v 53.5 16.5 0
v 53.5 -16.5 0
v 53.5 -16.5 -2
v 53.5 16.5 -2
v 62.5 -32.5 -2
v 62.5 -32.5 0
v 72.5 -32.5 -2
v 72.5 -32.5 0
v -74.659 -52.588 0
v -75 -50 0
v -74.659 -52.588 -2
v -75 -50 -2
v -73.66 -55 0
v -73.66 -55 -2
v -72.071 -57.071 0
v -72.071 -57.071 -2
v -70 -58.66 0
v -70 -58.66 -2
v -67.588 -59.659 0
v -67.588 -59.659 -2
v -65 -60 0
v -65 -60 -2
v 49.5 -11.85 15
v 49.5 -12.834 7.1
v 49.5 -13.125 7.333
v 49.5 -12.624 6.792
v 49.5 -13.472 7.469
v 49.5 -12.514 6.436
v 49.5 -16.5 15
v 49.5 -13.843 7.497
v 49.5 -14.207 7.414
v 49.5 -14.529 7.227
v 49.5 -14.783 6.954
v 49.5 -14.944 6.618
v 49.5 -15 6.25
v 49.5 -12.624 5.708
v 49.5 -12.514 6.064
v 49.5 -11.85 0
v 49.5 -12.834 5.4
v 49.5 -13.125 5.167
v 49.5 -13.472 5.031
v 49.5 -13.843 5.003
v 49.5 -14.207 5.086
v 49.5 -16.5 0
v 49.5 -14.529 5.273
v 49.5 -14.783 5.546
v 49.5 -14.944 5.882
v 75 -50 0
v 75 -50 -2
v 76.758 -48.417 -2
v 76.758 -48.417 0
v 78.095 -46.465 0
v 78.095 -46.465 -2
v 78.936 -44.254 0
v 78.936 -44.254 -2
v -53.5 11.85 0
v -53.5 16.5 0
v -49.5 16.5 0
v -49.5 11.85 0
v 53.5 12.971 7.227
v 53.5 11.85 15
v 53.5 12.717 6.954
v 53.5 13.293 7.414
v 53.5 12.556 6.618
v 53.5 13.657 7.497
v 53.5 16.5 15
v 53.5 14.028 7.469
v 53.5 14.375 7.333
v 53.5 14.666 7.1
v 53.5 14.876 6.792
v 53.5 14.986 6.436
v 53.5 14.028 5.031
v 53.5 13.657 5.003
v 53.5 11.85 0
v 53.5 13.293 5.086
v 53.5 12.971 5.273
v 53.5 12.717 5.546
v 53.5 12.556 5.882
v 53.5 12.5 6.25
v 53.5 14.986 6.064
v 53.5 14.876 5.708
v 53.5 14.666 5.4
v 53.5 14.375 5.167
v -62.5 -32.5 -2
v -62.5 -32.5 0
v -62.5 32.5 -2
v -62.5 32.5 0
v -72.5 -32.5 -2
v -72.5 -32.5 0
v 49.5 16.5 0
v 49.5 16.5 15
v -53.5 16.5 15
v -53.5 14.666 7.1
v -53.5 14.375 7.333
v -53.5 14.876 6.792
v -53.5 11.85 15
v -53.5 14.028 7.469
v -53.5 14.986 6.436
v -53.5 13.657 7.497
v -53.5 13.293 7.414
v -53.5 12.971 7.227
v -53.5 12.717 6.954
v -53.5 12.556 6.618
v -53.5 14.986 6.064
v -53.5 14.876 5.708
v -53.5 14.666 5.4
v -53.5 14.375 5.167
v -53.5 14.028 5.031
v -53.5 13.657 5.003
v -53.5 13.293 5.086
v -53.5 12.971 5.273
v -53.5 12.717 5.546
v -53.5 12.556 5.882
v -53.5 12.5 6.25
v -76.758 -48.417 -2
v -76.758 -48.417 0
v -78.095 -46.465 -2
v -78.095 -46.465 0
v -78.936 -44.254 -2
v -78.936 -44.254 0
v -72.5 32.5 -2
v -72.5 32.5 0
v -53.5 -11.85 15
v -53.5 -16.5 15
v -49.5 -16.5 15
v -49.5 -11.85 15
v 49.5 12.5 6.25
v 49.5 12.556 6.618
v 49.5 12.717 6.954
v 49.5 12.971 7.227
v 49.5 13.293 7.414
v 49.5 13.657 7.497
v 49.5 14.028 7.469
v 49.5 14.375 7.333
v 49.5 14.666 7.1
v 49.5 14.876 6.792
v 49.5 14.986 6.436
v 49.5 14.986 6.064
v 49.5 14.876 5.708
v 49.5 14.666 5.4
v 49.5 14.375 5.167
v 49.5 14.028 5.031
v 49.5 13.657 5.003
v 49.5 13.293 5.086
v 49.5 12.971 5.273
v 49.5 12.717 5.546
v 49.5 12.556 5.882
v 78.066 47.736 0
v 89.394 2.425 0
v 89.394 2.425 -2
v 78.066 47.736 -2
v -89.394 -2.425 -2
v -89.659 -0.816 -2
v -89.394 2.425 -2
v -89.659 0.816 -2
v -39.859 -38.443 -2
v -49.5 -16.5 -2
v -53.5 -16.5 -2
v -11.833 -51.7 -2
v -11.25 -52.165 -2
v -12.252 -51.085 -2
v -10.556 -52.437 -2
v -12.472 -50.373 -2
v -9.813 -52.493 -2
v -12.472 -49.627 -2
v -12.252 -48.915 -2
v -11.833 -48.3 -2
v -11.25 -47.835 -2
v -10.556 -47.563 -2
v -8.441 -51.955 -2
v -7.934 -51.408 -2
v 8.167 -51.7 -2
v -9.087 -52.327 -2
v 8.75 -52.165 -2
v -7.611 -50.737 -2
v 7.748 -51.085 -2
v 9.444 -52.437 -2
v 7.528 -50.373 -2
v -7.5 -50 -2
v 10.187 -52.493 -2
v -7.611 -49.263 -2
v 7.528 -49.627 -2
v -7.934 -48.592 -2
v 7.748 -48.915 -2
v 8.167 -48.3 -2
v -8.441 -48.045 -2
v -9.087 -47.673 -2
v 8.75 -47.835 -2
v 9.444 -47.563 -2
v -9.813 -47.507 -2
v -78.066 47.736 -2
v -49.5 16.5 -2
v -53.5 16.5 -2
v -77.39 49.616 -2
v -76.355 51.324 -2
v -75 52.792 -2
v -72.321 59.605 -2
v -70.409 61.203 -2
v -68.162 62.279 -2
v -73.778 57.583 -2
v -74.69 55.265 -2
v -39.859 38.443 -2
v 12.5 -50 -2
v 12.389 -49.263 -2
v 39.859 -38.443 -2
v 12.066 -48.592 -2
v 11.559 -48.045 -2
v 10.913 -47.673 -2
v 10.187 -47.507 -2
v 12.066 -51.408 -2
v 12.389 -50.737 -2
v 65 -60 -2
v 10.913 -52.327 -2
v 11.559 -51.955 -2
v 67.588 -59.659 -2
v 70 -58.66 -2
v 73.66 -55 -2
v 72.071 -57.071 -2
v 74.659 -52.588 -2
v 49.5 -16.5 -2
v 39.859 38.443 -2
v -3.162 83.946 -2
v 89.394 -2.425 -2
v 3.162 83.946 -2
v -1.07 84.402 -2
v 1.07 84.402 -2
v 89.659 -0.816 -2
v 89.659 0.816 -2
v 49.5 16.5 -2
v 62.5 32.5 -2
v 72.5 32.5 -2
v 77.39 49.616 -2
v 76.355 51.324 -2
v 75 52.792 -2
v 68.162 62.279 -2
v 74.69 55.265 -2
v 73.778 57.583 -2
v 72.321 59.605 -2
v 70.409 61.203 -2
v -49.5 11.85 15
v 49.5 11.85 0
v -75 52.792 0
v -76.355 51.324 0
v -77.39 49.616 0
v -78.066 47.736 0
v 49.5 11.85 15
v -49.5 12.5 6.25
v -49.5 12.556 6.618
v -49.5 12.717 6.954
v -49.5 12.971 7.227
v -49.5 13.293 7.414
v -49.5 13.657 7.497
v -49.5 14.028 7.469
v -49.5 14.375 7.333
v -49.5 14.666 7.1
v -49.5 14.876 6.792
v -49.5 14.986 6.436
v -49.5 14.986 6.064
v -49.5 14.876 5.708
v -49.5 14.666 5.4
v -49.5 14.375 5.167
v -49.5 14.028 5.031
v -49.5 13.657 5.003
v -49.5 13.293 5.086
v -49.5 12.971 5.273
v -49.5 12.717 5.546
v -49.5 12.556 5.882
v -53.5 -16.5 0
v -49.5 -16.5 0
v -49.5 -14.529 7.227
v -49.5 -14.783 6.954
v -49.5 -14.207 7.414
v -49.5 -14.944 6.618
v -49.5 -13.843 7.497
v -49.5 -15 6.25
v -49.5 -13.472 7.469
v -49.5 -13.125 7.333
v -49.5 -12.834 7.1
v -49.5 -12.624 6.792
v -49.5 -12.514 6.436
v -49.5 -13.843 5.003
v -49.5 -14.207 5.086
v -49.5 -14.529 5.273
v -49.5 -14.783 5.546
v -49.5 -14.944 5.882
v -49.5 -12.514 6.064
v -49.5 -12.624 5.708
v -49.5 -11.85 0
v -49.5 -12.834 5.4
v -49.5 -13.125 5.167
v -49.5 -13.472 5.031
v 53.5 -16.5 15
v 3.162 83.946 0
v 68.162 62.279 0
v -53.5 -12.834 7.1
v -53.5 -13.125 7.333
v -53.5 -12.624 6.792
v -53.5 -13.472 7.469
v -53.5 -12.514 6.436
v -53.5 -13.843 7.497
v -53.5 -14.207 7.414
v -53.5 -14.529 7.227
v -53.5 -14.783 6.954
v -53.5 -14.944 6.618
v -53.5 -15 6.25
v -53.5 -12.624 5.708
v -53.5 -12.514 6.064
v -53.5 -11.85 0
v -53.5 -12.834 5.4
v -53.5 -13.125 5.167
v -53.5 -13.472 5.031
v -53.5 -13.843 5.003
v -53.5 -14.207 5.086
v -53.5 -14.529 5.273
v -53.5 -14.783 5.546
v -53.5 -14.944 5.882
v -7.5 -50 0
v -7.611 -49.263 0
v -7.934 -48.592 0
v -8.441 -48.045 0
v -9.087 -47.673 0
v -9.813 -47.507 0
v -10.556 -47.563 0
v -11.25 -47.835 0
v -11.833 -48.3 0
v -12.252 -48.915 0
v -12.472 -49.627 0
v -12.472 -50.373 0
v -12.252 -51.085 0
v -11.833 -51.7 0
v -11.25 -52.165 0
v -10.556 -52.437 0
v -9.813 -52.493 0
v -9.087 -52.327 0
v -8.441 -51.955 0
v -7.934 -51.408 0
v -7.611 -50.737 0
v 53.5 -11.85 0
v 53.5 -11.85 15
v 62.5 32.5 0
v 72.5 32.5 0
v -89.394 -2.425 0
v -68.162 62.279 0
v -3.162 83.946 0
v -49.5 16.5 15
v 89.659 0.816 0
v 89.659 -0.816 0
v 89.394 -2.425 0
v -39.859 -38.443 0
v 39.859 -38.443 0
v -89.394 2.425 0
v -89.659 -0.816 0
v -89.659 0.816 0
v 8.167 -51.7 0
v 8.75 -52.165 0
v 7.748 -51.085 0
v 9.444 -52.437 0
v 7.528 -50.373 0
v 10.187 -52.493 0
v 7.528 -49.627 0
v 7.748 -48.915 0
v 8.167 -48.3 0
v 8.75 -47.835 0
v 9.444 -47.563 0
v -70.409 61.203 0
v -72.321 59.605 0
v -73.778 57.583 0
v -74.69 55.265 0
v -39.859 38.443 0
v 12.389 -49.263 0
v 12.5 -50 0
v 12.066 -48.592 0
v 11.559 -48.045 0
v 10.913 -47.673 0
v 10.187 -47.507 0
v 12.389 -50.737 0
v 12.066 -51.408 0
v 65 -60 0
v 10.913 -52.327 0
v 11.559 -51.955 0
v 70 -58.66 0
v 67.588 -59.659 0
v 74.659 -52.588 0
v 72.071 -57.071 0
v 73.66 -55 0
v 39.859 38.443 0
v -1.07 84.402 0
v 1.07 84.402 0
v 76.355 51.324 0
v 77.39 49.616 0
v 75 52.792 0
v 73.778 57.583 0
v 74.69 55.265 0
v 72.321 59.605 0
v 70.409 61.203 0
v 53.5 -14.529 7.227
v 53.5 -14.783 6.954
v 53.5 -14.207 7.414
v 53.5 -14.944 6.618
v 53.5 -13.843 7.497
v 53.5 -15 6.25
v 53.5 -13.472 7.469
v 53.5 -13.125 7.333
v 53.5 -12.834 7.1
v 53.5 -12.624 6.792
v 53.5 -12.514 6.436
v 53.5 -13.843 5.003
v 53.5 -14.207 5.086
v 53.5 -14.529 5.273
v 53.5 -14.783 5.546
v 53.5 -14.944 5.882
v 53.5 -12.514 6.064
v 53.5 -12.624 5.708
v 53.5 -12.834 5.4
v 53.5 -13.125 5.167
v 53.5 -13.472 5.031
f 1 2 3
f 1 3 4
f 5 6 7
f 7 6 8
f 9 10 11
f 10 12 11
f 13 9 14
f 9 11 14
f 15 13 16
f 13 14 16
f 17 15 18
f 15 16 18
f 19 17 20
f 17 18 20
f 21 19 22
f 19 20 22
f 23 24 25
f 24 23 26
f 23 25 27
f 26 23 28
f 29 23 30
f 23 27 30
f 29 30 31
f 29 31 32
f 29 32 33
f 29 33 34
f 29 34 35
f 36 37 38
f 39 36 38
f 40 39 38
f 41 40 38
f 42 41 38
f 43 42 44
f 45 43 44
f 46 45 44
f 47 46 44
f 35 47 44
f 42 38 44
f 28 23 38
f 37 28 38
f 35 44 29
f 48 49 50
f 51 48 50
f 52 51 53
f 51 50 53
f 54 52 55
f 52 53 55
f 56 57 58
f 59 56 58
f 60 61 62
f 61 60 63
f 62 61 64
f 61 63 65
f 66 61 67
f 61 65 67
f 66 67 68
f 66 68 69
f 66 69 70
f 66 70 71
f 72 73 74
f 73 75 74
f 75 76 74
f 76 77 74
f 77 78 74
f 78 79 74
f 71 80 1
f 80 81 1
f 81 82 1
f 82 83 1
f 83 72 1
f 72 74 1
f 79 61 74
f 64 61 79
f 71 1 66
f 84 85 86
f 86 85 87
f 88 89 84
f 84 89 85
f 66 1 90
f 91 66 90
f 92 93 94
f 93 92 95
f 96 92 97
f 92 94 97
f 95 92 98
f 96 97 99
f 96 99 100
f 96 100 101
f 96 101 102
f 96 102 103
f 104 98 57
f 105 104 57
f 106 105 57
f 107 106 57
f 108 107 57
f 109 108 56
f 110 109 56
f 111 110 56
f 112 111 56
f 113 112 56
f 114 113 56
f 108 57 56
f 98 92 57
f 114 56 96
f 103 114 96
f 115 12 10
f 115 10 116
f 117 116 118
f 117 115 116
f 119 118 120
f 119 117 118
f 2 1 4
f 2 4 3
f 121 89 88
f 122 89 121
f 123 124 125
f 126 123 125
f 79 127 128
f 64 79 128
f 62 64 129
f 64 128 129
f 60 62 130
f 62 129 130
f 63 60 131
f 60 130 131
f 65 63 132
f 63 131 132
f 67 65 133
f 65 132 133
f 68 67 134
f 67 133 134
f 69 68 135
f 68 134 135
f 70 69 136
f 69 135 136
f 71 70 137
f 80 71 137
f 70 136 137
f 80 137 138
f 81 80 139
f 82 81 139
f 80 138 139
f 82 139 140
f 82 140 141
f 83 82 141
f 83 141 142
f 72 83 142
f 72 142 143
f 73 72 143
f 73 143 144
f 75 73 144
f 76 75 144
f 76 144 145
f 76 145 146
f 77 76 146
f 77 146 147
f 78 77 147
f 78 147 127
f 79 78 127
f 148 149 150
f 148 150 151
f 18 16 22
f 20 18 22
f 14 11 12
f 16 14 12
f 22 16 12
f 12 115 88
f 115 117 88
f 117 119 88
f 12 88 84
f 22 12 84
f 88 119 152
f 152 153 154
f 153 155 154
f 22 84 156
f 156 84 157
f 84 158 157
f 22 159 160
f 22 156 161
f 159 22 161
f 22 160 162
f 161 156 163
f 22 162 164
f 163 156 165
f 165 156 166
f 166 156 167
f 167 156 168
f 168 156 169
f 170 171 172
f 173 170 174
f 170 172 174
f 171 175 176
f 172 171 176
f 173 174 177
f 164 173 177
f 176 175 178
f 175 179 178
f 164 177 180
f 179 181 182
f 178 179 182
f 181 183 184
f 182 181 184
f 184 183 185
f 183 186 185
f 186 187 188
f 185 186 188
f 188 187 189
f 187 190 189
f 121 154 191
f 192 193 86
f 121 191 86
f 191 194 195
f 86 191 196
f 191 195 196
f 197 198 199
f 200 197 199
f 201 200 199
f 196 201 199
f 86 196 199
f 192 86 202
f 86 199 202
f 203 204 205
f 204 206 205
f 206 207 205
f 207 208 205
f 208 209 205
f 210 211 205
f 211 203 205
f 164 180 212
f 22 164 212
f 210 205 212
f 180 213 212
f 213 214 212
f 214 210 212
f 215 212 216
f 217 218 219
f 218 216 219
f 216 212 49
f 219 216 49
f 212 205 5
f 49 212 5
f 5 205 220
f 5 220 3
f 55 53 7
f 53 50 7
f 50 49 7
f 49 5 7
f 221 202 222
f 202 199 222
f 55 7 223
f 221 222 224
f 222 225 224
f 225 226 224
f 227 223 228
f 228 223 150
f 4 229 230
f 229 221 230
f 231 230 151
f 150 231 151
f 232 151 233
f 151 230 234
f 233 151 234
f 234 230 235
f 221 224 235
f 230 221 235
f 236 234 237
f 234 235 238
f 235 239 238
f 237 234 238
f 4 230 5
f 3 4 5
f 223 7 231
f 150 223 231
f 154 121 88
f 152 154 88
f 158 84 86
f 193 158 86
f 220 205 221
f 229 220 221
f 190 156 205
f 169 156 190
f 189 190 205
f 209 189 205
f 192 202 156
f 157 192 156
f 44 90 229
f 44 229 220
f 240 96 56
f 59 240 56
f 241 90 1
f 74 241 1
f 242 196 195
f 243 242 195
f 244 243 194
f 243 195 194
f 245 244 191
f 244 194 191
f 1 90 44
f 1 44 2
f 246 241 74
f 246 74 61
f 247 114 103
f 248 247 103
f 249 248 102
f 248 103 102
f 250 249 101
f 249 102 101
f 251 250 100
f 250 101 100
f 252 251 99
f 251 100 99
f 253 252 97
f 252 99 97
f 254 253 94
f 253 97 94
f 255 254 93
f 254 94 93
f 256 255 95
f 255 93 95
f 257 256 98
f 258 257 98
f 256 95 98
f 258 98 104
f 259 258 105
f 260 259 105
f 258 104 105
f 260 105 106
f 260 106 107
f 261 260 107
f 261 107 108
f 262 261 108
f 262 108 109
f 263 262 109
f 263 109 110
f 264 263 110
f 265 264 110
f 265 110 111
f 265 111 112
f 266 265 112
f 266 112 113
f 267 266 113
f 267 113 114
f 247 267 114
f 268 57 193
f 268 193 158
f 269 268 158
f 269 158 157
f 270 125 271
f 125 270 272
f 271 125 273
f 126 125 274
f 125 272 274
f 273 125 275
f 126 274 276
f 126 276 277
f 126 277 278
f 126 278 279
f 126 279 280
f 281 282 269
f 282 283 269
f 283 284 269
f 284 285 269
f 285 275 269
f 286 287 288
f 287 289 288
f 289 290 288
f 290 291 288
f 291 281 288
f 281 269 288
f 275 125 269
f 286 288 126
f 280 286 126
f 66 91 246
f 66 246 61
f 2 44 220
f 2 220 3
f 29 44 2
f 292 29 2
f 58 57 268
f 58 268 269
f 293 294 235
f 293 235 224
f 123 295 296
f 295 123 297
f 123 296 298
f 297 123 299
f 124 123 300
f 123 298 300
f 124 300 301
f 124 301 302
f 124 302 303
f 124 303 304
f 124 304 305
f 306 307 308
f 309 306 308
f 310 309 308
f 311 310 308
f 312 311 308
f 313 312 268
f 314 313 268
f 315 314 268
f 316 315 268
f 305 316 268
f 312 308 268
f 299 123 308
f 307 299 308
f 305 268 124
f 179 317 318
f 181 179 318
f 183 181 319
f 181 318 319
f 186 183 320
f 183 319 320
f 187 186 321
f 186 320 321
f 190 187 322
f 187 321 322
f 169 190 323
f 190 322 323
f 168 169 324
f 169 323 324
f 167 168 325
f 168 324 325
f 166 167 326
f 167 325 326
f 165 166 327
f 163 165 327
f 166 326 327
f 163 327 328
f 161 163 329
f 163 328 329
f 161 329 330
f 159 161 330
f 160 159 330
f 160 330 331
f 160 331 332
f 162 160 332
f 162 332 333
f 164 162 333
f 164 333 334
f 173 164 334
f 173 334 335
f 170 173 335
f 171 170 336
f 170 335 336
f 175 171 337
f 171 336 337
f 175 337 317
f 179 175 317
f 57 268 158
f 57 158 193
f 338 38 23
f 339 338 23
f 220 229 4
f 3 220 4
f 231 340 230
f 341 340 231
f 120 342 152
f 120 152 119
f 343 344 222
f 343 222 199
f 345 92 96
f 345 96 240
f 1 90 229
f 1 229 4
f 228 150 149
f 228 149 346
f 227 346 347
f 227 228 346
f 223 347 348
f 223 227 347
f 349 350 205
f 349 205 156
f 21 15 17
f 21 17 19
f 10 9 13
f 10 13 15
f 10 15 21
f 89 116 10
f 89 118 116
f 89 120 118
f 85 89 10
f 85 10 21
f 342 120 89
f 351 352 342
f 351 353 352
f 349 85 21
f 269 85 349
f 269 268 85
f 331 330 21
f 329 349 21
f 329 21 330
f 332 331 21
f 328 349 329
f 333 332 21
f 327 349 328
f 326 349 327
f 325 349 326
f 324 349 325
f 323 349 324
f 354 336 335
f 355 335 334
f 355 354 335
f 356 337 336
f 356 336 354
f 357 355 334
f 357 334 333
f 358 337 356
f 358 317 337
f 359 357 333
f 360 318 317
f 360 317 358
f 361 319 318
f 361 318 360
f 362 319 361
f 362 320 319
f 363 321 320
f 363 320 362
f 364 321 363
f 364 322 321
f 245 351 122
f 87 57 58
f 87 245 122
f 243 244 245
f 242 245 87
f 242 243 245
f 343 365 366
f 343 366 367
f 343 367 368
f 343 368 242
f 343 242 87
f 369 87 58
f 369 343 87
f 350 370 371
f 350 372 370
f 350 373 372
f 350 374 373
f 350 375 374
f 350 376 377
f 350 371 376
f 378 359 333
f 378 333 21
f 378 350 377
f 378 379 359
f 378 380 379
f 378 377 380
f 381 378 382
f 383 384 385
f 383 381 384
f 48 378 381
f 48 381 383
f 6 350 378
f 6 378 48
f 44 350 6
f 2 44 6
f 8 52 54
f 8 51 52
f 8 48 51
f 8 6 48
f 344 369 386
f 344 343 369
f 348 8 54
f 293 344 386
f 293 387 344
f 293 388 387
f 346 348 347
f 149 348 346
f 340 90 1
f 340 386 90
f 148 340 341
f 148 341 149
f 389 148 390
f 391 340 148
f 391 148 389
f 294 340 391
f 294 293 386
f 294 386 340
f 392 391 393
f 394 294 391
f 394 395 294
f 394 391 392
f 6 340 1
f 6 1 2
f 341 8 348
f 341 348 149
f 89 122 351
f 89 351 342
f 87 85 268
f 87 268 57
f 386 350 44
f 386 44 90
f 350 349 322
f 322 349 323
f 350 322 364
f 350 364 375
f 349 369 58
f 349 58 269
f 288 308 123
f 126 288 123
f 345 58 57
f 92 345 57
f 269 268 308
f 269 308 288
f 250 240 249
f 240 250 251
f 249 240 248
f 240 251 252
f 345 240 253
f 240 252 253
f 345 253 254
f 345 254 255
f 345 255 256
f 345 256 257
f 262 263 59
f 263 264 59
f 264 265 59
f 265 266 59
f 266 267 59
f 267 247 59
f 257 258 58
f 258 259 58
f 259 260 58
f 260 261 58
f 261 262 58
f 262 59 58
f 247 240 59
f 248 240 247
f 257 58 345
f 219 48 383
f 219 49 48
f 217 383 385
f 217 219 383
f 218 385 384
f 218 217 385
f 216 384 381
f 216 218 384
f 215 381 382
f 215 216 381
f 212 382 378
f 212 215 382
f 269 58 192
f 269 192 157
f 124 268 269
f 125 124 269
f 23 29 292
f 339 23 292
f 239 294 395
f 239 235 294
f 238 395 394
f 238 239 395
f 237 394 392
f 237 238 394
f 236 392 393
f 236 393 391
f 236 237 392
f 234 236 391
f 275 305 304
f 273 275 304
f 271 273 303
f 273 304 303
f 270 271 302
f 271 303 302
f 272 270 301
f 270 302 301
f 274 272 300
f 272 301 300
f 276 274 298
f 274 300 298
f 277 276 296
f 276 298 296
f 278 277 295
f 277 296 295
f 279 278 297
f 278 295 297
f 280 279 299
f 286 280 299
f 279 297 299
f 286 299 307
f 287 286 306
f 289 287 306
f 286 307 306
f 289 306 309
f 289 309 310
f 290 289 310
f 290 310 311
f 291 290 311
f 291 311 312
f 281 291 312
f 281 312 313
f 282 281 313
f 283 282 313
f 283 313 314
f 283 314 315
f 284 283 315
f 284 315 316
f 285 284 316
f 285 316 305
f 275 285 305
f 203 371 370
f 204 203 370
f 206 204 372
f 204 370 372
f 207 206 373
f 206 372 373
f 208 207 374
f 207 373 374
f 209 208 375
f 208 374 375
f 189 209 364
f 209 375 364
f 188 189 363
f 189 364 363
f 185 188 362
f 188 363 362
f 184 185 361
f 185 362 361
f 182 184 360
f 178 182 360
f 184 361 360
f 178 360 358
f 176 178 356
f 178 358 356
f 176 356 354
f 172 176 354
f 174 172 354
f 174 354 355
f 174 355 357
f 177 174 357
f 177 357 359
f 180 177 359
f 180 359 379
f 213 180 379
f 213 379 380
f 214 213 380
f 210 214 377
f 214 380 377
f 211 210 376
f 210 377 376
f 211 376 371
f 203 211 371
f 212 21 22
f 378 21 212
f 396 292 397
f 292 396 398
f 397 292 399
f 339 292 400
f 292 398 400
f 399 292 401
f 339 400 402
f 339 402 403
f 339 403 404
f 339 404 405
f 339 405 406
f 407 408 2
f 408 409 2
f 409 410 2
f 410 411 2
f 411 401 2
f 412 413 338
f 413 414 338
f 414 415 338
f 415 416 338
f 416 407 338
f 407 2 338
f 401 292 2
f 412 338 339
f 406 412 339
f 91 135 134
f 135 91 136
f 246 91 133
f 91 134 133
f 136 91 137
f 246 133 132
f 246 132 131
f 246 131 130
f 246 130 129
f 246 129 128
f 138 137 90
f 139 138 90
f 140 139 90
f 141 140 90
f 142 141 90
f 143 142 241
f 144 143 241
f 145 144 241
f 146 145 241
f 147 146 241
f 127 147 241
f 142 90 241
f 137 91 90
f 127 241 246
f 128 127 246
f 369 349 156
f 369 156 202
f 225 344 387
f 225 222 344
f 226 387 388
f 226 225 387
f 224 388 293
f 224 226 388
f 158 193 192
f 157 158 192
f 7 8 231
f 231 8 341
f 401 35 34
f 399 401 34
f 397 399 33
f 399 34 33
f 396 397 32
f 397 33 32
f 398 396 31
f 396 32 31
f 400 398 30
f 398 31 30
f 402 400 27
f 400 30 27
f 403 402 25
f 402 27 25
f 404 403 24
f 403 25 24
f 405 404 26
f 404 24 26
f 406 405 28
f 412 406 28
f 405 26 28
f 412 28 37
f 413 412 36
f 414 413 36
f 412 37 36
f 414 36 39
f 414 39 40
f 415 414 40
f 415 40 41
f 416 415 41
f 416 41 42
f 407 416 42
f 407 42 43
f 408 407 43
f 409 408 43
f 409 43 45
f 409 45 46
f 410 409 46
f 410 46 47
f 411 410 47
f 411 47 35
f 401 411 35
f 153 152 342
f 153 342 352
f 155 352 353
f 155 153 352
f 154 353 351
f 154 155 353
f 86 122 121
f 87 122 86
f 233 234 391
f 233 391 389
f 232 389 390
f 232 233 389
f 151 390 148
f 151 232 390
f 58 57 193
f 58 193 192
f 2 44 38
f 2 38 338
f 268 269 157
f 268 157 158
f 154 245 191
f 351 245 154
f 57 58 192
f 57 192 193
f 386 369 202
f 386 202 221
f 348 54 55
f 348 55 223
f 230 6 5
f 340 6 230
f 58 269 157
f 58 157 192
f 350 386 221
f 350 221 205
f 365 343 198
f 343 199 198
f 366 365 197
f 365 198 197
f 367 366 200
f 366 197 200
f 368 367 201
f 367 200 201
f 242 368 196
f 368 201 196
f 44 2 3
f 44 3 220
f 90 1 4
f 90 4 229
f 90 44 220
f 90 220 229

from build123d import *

# Parameters (mm, degrees)
F0_R         = 2.5
F0_W         = 10
F0_H         = 65
F1_DEPTH     = 2
F2_DEPTH     = 15
F3_R         = 10
F4_R         = 1.25
F5_DEPTH     = 4.4
F6_DEPTH     = 2
F7_R         = 1.25
F8_DEPTH     = 4.7
F7_W         = 23.7
F7_H         = 15
F9_DEPTH     = 4.3
F10_DEPTH    = 2
F11_T1_DEPTH = 83.1509498697
F11_T3_DEPTH = 65.2047050598
F11_T5_DEPTH = 14.5


# Not quite as in the source:
# - a fillet or chamfer that OpenCascade refuses, or shapes differently, is made with other operations: its cross-section is extruded or revolved along the edge and cut away or added


with BuildPart() as f1:
    # F0 (on Top) → F1 (new body)
    with BuildSketch(Plane.XY):
        Polygon((0, 85), (-75, 60), (0, 60), align=None)
        Polygon((0, 85), (0, 60), (75, 60), align=None)
        Polygon((0, 60), (-75, 60), (-75, -60), (0, -60), (75, -60), (75, 60), align=None)
        with Locations((-10, -50)):
            Circle(F0_R, mode=Mode.SUBTRACT)
        with Locations((-67.5, 0)):
            Rectangle(F0_W, F0_H, mode=Mode.SUBTRACT)
        Polygon((-53.5, 16.5), (-49.5, 16.5), (-49.5, 12), (-49.5, -12), (-49.5, -16.5), (-53.5, -16.5), align=None, mode=Mode.SUBTRACT)
        with Locations((10, -50)):
            Circle(F0_R, mode=Mode.SUBTRACT)
        Polygon((39.8586168885, -38.4434349835), (0, -38.4434349835), (-39.8586168885, -38.4434349835), (-39.8586168885, 38.4434349835), (39.8586168885, 38.4434349835), align=None, mode=Mode.SUBTRACT)
        Polygon((49.5, 12), (49.5, 16.5), (53.5, 16.5), (53.5, -16.5), (49.5, -16.5), (49.5, -12), align=None, mode=Mode.SUBTRACT)
        with Locations((67.5, 0)):
            Rectangle(F0_W, F0_H, mode=Mode.SUBTRACT)
    extrude(amount=-F1_DEPTH)

    # F3
    f3_edges = [f1.edges().sort_by_distance(p)[0] for p in [
        (-75, -60, -1),
        (75, -60, -1),
        (75, 60, -1),
        (0, 85, -1),
        (-75, 60, -1),
    ]]
    fillet(f3_edges, radius=F3_R)

    # F0 (on Top) → F10 (join)
    with BuildSketch(Plane.XY):
        Polygon((-75, -60), (-75, 60), (-90, 0), align=None)
        Polygon((90, 0), (75, 60), (75, -60), align=None)
    extrude(amount=-F10_DEPTH)

    # F11: fillet of radius 10 on 6 edges, made by hand

    # F11_s2 → F11_t1 (cut)
    with BuildSketch(Plane.XY.offset(-42.5754749349)):
        with BuildLine():
            ThreePointArc((-75, -50), (-77.484564926, -47.4809714737), (-78.9363992698, -44.2544029208))
            Line((-78.9363992698, -44.2544029208), (-75, -60))
            Line((-75, -60), (-75, -50))
        make_face()
        with BuildLine():
            ThreePointArc((75, -50), (77.484564926, -47.4809714737), (78.9363992698, -44.2544029208))
            Line((78.9363992698, -44.2544029208), (75, -60))
            Line((75, -60), (75, -50))
        make_face()
    extrude(amount=F11_T1_DEPTH, mode=Mode.SUBTRACT)

    # F11_s4 → F11_t3 (cut)
    with BuildSketch(Plane.XY.offset(-33.6023525299)):
        with BuildLine():
            ThreePointArc((75, 52.7924077994), (76.9151696289, 50.4962288752), (78.0658785294, 47.7364858825))
            Line((78.0658785294, 47.7364858825), (75, 60))
            Line((75, 60), (75, 52.7924077994))
        make_face()
        with BuildLine():
            ThreePointArc((-75, 52.7924077994), (-76.9151696289, 50.4962288752), (-78.0658785294, 47.7364858825))
            Line((-78.0658785294, 47.7364858825), (-75, 60))
            Line((-75, 60), (-75, 52.7924077994))
        make_face()
    extrude(amount=F11_T3_DEPTH, mode=Mode.SUBTRACT)

    # F11_s6 → F11_t5 (cut)
    with BuildSketch(Plane.XY.offset(-8.25)):
        with BuildLine():
            ThreePointArc((89.3936609374, 2.4253562504), (89.692235936, 0), (89.3936609374, -2.4253562504))
            Line((89.3936609374, -2.4253562504), (90, 0))
            Line((90, 0), (89.3936609374, 2.4253562504))
        make_face()
        with BuildLine():
            ThreePointArc((-89.3936609374, -2.4253562504), (-89.692235936, 0), (-89.3936609374, 2.4253562504))
            Line((-89.3936609374, 2.4253562504), (-90, 0))
            Line((-90, 0), (-89.3936609374, -2.4253562504))
        make_face()
    extrude(amount=F11_T5_DEPTH, mode=Mode.SUBTRACT)


with BuildPart() as f2:
    # F0 (on Top) → F2 (new body)
    with BuildSketch(Plane.XY):
        Polygon((-49.5, 12), (-49.5, 16.5), (-53.5, 16.5), (-53.5, -16.5), (-49.5, -16.5), (-49.5, -12), align=None)
    extrude(amount=F2_DEPTH)

    # F4 (on face) → F5 (cut)
    with BuildSketch(Plane(origin=(-53.5, 0, 0), x_dir=(0, -1, 0), z_dir=(-1, 0, 0))):
        with Locations((-13.75, 6.25)):
            Circle(F4_R)
        with Locations((13.75, 6.25)):
            Circle(F4_R)
        Polygon((11.85, 15), (0, 15), (-11.85, 15), (-11.85, 0), (11.85, 0), align=None)
    extrude(amount=-F5_DEPTH, mode=Mode.SUBTRACT)


with BuildPart() as f2b:
    # F0 (on Top) → F2, piece 2 (new body)
    with BuildSketch(Plane.XY):
        Polygon((53.5, 16.5), (49.5, 16.5), (49.5, 12), (49.5, -12), (49.5, -16.5), (53.5, -16.5), align=None)
    extrude(amount=F2_DEPTH)

    # F7 (on face) → F8 (cut)
    with BuildSketch(Plane(origin=(49.5, 0, 0), x_dir=(0, -1, 0), z_dir=(-1, 0, 0))):
        with Locations((-13.75, 6.25)):
            Circle(F7_R)
        with Locations((13.75, 6.25)):
            Circle(F7_R)
    extrude(amount=-F8_DEPTH, mode=Mode.SUBTRACT)

    # F7 (on face) → F9 (cut)
    with BuildSketch(Plane(origin=(49.5, 0, 0), x_dir=(0, -1, 0), z_dir=(-1, 0, 0))):
        with Locations((0, 7.5)):
            Rectangle(F7_W, F7_H)
    extrude(amount=-F9_DEPTH, mode=Mode.SUBTRACT)


with BuildPart() as f6:
    # F0 (on Top) → F6 (new body)
    with BuildSketch(Plane.XY):
        Polygon((53.5, 16.5), (49.5, 16.5), (49.5, 12), (49.5, -12), (49.5, -16.5), (53.5, -16.5), align=None)
    extrude(amount=-F6_DEPTH)


with BuildPart() as f6b:
    # F0 (on Top) → F6, piece 2 (new body)
    with BuildSketch(Plane.XY):
        Polygon((-49.5, 12), (-49.5, 16.5), (-53.5, 16.5), (-53.5, -16.5), (-49.5, -16.5), (-49.5, -12), align=None)
    extrude(amount=-F6_DEPTH)


solid = Compound([f1.part, f2.part, f2b.part, f6.part, f6b.part])
